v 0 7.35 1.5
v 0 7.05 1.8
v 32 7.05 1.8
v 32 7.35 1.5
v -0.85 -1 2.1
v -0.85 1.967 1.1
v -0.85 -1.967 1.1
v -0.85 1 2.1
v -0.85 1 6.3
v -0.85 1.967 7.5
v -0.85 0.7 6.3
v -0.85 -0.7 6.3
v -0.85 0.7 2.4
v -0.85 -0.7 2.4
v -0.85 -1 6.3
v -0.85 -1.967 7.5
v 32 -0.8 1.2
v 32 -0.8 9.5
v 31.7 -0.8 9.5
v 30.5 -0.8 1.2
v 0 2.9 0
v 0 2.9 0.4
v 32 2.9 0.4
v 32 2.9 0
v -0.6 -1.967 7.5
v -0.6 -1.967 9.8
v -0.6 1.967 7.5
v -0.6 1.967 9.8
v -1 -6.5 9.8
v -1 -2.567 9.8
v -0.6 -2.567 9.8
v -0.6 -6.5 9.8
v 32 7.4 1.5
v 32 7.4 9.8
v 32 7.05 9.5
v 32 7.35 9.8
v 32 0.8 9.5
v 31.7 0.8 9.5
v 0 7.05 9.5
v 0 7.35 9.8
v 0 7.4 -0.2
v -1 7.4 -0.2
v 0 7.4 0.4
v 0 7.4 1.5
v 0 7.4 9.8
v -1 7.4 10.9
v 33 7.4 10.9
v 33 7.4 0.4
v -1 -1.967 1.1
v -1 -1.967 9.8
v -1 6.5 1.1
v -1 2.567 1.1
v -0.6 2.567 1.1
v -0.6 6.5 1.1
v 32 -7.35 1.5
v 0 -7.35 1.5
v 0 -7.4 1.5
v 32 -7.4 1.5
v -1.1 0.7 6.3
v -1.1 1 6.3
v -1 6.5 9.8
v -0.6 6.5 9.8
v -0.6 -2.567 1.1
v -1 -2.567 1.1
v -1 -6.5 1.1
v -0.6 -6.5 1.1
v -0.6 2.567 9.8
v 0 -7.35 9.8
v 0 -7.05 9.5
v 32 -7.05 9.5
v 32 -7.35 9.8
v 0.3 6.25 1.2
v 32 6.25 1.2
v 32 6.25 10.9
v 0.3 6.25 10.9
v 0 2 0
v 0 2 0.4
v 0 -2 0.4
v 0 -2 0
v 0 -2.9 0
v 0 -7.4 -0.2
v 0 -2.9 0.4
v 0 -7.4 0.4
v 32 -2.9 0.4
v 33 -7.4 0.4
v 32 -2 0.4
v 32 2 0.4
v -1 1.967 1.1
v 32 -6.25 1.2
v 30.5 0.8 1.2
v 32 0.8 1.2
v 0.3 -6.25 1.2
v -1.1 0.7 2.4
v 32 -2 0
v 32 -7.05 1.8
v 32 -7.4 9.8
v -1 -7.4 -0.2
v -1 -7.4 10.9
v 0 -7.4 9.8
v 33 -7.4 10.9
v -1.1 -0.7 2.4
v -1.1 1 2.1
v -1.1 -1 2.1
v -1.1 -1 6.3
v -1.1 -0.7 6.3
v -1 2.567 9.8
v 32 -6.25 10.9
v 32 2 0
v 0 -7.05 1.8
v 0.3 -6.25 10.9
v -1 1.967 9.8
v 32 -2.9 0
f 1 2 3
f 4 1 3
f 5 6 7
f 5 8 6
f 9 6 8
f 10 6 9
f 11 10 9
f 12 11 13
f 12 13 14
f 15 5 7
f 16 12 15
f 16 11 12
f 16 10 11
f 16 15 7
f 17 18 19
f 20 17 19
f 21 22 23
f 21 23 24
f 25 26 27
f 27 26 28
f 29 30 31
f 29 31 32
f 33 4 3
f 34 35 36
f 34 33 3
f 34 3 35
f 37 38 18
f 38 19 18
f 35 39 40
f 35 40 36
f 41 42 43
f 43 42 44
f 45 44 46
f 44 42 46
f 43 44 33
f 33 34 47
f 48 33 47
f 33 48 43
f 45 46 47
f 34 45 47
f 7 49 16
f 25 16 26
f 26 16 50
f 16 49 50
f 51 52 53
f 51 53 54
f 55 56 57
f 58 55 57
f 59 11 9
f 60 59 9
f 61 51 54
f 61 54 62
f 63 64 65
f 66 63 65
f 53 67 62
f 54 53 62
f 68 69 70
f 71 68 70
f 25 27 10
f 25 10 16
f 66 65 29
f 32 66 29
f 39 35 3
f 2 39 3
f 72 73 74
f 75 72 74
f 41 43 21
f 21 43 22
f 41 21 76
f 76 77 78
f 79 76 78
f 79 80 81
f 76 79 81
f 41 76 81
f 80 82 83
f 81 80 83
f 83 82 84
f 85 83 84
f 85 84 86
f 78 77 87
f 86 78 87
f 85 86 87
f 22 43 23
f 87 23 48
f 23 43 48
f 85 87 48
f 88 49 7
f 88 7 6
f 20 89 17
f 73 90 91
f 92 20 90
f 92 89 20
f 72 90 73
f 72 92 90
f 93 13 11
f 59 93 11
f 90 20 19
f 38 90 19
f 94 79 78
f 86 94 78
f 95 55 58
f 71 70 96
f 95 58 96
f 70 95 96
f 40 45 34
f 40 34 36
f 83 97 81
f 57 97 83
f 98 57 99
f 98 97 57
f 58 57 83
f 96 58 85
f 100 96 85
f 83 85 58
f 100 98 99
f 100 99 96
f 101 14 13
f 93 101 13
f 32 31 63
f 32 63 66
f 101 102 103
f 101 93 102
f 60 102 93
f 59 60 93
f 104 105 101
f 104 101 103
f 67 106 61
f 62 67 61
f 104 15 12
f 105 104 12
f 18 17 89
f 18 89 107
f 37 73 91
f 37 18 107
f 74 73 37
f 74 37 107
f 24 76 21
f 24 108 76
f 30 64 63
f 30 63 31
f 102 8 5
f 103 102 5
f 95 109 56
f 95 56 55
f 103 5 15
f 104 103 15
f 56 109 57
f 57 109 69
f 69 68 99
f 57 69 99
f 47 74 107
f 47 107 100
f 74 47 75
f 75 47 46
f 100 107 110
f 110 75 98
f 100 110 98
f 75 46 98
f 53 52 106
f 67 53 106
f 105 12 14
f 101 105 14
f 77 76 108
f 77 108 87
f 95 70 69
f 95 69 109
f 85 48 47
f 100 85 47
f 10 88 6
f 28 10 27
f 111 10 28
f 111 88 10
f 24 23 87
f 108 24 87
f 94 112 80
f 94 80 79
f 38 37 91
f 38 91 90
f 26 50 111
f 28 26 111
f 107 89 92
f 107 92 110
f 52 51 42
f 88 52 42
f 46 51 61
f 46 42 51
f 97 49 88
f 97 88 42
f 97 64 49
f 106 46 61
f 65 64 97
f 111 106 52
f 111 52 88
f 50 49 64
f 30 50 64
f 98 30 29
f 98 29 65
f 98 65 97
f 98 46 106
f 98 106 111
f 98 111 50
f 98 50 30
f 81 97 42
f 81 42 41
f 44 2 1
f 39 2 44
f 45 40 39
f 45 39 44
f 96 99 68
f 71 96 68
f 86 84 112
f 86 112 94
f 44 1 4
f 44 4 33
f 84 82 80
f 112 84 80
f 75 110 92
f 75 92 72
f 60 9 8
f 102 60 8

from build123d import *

# Parameters (mm, degrees)
F1_DEPTH  = 32
F2_W      = 1
F2_H      = 10.5
F3_DEPTH  = 7.4
F4_W      = 7.4
F4_H      = 10.9
F5_DEPTH  = 1
F6_W      = 3.9333333333
F6_H      = 8.7
F6_W_2    = 1.9666666667
F7_DEPTH  = 0.4
F8_SIZE   = 0.3
F10_DEPTH = 0.8
F12_W     = 1
F12_H     = 14.8
F13_DEPTH = 0.2
F14_DEPTH = 0.3
F15_W     = 3.9333333333
F15_H     = 6.4
F16_DEPTH = 0.25
F18_DEPTH = 0.25


with BuildPart() as f1:
    # F0 (on Right) → F1 (new body)
    with BuildSketch(Plane.YZ):
        Polygon((-6.25, 10.9), (-7.4, 10.9), (-7.4, 9.8), (-7.05, 9.8), (-7.05, 1.5), (-7.4, 1.5), (-7.4, 0.4), (-2.9, 0.4), (-2.9, 0), (-2, 0), (-2, 0.4), (0, 0.4), (0, 1.2), (-6.25, 1.2), align=None)
    extrude(amount=F1_DEPTH)

    # F2 (on face) → F3 (join, through all)
    with BuildSketch(Plane.XZ.offset(7.4)):
        with Locations((32.5, 5.65)):
            Rectangle(F2_W, F2_H)
    extrude(amount=-F3_DEPTH)

    # F4 (on face) → F5 (join)
    with BuildSketch(Plane(origin=(0, 0, 0), x_dir=(0, -1, 0), z_dir=(-1, 0, 0))):
        with Locations((3.7, 5.45)):
            Rectangle(F4_W, F4_H)
    extrude(amount=F5_DEPTH)

    # F6 (on face) → F7 (cut)
    with BuildSketch(Plane(origin=(-1, 0, 0), x_dir=(0, -1, 0), z_dir=(-1, 0, 0))):
        with Locations((4.5333333333, 5.45)):
            Rectangle(F6_W, F6_H)
        with Locations((0.9833333333, 5.45)):
            Rectangle(F6_W_2, F6_H)
    extrude(amount=-F7_DEPTH, mode=Mode.SUBTRACT)

    # F8
    f8_edges = [f1.edges().sort_by_distance(p)[0] for p in [
        (16, -7.05, 1.5),
        (16, -7.05, 9.8),
    ]]
    chamfer(f8_edges, length=F8_SIZE)

    # F9 (on face) → F10 (join)
    with BuildSketch(Plane(origin=(0, 0, 0), x_dir=(-1, 0, 0), z_dir=(0, 1, 0))):
        Polygon((-32, 9.5), (-32, 1.2), (-30.5, 1.2), (-31.7, 9.5), align=None)
    extrude(amount=-F10_DEPTH)

    # F11: F1 across face


with BuildPart() as f1_1:
    add(f1.part)
    add(f1.part.mirror(Plane(origin=(19.2854383212, 0, 3.0068542852), x_dir=(-1, 0, 0), z_dir=(0, 1, 0))))

    # F12 (on face) → F13 (join)
    with BuildSketch(Plane(origin=(0, 0, 0), x_dir=(1, 0, 0), z_dir=(0, 0, -1))):
        with Locations((-0.5, 0)):
            Rectangle(F12_W, F12_H)
    extrude(amount=F13_DEPTH)

    # F14 (add): a face of the model
    f14_faces = [f1_1.faces().sort_by_distance(p)[0] for p in [
        (0, 0, 6.05),
    ]]
    extrude(f14_faces, amount=F14_DEPTH)

    # F15 (on face) → F16 (join)
    with BuildSketch(Plane(origin=(-0.6, 0, 0), x_dir=(0, -1, 0), z_dir=(-1, 0, 0))):
        with Locations((0, 4.3)):
            Rectangle(F15_W, F15_H)
    extrude(amount=F16_DEPTH)

    # F17 (on face) → F18 (join)
    with BuildSketch(Plane(origin=(-0.85, 0, 0), x_dir=(0, -1, 0), z_dir=(-1, 0, 0))):
        Polygon((-0.7, 6.3), (-1, 6.3), (-1, 2.1), (1, 2.1), (1, 6.3), (0.7, 6.3), (0.7, 2.4), (-0.7, 2.4), align=None)
    extrude(amount=F18_DEPTH)


solid = f1_1.part
